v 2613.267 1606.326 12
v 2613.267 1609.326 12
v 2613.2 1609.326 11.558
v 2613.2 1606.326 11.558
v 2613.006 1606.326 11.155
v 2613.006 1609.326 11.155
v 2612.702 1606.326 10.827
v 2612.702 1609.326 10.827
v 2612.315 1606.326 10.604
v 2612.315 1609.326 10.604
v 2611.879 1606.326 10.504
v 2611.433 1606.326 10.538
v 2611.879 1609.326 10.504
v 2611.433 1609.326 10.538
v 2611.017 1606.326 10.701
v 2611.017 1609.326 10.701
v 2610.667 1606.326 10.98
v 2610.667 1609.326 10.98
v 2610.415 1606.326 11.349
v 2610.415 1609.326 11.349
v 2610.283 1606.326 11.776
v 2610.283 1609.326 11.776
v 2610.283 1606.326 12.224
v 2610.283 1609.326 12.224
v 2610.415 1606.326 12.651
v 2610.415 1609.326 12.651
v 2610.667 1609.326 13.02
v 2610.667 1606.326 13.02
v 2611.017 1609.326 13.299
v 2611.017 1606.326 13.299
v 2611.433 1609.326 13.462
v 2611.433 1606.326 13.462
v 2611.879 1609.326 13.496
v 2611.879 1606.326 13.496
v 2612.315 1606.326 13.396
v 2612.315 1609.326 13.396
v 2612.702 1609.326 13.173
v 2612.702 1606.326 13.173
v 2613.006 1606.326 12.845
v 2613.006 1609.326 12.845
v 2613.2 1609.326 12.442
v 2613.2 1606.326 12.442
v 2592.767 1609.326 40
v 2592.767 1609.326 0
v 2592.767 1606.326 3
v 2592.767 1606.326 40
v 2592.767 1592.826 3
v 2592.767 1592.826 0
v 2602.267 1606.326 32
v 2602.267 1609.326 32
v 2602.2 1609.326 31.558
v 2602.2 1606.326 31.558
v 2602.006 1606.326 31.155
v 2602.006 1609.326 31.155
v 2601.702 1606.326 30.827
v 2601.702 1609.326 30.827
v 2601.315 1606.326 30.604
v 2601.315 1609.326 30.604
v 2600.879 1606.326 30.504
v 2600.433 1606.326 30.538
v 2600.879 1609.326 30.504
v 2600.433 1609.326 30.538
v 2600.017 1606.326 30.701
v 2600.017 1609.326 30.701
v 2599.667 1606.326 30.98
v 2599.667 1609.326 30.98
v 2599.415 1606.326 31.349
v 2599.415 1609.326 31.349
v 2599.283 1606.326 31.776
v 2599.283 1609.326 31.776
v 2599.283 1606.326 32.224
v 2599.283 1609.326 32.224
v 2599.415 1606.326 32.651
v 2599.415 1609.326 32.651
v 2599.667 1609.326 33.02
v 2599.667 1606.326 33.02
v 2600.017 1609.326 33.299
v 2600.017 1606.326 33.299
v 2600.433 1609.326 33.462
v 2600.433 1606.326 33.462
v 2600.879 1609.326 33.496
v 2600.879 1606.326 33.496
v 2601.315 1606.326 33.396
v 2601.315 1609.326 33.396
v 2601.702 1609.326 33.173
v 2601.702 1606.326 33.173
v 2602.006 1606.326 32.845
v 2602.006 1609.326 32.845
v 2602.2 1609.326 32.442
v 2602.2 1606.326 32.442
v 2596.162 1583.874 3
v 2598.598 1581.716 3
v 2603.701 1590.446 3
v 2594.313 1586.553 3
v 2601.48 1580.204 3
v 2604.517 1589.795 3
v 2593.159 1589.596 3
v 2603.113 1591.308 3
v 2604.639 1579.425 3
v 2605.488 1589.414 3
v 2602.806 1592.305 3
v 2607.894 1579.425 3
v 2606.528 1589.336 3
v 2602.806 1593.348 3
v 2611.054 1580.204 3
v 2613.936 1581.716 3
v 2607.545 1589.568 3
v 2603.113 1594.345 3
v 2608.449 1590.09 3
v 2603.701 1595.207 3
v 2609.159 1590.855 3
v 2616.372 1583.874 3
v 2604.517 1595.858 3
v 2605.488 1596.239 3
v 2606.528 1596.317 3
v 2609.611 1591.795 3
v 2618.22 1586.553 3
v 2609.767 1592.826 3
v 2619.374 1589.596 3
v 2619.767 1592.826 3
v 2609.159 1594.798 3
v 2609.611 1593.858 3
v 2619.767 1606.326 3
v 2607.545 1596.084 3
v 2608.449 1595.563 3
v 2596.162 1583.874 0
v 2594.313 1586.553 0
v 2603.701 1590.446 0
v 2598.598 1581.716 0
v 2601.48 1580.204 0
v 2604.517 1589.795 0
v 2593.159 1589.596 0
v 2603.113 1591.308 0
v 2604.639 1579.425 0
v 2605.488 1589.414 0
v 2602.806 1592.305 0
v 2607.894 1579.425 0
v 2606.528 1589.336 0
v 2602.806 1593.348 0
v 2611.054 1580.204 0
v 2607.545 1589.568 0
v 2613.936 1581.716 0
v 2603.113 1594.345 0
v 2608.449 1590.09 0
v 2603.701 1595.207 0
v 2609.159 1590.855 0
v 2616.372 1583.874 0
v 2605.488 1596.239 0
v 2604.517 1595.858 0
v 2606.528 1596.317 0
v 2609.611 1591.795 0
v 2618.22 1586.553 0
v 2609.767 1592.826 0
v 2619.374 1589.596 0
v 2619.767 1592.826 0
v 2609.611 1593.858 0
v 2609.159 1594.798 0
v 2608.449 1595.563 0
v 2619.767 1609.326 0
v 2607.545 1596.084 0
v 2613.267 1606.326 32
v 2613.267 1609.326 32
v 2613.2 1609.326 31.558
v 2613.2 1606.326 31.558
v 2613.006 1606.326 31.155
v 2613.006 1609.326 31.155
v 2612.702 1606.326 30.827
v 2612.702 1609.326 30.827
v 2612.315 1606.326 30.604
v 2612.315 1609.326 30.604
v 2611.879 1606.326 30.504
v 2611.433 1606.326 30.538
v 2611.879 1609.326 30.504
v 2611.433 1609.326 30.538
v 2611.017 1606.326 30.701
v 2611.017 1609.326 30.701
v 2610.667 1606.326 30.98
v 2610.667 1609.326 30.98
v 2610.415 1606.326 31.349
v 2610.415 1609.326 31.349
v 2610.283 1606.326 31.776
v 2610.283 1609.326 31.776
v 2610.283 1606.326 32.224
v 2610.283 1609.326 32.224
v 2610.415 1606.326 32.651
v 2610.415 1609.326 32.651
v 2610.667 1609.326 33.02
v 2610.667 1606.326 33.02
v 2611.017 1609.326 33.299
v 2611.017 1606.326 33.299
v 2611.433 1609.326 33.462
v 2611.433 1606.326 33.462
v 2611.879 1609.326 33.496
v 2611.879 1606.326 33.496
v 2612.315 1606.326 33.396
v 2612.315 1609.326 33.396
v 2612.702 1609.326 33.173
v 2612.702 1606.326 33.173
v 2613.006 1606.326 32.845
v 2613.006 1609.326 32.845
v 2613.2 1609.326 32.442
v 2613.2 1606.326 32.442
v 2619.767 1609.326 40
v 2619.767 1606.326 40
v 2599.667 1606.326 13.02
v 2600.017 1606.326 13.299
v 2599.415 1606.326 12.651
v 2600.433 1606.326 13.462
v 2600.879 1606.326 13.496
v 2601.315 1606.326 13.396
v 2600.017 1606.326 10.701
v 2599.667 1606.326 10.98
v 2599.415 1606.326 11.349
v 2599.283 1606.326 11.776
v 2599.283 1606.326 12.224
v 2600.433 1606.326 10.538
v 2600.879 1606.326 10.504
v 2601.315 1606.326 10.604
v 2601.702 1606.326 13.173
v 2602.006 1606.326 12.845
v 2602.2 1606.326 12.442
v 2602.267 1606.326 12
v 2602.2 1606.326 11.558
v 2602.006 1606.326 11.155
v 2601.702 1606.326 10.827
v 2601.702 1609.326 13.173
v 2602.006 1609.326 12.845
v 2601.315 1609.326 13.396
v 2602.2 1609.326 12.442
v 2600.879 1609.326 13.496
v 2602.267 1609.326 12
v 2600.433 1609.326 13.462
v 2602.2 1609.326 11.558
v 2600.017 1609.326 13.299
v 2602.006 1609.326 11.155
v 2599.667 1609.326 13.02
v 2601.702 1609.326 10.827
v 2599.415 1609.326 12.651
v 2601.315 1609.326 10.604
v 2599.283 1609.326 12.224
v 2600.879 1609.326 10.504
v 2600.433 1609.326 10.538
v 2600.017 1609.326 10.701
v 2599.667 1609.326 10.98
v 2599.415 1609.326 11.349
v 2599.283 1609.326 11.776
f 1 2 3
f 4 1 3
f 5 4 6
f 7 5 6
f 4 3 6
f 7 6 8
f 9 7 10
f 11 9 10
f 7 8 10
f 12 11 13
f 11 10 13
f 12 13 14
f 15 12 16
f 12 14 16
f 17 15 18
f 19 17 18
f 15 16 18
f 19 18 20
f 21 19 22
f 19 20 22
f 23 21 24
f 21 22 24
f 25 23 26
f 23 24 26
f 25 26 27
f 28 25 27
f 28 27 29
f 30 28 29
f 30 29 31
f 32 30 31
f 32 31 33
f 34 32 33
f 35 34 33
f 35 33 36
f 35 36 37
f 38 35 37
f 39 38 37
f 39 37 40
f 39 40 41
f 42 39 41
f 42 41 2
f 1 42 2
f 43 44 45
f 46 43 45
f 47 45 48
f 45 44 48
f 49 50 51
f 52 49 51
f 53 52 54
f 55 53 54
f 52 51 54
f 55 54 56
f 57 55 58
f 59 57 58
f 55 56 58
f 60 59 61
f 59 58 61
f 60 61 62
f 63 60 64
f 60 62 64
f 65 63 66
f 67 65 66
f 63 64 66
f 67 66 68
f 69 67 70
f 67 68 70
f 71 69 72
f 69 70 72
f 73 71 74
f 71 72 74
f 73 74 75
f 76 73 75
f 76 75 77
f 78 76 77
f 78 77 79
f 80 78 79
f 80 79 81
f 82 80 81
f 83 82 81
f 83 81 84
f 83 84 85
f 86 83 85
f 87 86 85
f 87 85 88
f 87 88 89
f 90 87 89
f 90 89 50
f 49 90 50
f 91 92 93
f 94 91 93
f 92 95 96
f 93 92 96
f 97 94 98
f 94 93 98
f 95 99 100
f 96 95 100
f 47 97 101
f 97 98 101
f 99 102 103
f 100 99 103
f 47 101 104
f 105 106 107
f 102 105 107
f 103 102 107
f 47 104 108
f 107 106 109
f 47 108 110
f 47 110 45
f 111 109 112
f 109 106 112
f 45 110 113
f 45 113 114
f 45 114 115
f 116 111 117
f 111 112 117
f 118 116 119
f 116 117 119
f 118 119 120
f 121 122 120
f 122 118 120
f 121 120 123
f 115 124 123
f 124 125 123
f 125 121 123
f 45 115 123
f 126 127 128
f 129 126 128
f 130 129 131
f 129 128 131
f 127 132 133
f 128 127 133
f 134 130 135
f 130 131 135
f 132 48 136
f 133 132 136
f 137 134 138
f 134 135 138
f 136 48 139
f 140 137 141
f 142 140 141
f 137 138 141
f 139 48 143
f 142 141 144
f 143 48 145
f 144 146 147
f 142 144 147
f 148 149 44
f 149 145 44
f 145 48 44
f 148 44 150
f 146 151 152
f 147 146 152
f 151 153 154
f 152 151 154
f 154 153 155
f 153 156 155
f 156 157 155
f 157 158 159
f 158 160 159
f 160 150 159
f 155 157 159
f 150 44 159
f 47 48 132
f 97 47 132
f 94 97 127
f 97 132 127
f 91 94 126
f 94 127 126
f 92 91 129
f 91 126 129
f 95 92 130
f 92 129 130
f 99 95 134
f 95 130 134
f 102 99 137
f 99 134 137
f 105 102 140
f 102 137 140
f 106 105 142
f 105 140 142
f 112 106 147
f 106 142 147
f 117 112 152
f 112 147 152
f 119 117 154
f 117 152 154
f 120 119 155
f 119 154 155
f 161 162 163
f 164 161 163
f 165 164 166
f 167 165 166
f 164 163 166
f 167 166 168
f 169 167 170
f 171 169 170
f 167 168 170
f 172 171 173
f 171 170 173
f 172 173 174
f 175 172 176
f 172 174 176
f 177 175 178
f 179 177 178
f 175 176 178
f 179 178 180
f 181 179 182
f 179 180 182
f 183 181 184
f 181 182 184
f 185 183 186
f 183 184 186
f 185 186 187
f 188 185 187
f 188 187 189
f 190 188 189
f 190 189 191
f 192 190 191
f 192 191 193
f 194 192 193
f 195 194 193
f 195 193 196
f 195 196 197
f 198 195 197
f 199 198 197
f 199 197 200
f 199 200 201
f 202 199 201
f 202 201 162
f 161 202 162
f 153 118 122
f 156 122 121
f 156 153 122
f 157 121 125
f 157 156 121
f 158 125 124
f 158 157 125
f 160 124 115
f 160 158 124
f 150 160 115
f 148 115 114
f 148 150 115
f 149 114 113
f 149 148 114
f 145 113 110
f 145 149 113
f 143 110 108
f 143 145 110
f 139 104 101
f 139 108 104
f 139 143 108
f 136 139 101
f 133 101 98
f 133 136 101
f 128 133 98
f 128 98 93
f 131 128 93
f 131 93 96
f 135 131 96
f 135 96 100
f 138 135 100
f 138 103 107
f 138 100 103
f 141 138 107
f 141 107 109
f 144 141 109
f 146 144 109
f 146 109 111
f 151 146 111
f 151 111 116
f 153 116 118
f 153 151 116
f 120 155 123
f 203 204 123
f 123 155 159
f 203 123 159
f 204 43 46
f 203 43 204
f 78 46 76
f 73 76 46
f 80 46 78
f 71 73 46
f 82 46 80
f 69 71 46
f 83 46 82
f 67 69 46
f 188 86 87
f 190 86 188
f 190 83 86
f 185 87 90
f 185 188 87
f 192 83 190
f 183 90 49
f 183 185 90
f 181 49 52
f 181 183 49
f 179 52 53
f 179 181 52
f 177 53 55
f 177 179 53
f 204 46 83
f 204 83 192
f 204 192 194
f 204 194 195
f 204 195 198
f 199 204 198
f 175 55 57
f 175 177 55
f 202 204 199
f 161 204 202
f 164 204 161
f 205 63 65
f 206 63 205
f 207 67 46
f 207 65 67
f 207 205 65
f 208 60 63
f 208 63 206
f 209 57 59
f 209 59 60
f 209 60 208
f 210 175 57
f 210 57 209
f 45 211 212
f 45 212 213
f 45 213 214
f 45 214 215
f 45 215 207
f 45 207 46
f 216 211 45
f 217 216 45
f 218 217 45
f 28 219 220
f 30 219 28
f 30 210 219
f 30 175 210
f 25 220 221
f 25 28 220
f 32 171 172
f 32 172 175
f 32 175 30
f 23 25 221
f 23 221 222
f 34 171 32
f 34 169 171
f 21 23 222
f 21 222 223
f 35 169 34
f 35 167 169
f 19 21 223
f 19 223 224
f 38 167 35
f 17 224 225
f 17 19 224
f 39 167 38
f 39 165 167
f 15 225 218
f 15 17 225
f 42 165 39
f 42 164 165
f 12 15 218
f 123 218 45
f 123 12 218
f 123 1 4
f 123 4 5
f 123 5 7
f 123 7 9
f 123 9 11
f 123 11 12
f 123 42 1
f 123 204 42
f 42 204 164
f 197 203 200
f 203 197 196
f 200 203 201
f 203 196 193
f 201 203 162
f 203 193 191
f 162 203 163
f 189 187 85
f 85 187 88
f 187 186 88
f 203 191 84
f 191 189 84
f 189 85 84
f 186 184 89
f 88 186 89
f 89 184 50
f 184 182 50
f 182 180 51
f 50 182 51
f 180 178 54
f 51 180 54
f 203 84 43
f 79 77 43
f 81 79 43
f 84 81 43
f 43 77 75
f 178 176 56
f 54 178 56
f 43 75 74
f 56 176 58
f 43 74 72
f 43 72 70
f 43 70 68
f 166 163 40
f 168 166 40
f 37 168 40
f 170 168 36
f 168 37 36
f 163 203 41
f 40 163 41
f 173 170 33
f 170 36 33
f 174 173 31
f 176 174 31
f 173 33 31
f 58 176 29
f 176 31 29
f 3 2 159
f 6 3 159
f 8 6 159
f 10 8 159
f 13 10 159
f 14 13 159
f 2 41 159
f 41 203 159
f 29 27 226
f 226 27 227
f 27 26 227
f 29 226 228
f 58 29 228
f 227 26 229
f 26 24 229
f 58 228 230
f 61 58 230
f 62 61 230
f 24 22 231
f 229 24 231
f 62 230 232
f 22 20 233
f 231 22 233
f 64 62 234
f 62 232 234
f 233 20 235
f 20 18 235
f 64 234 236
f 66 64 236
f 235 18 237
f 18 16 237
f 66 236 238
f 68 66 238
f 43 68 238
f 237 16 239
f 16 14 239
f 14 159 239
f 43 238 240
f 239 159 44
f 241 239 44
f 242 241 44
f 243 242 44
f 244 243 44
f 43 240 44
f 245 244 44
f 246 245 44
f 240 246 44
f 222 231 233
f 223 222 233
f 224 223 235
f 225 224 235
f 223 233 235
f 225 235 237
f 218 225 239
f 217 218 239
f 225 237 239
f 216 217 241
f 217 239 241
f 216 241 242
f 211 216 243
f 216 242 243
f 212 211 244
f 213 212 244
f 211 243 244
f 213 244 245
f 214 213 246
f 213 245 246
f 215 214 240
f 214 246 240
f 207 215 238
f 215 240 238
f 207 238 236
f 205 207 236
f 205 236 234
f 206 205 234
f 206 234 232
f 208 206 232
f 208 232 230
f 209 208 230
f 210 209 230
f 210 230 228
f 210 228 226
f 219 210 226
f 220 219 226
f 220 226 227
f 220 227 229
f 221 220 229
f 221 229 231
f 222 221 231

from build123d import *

# Parameters (mm, degrees)
MODEL_R             = 3.5
EXTRUDE_1_DEPTH     = 40
SKETCH_3_W          = 37
SKETCH_3_H          = 37
CUT_EXTRUDE_1_DEPTH = 40
SKETCH_4_R          = 1.5
CUT_EXTRUDE_2_DEPTH = 40


with BuildPart() as part:
    # Model → 凸台-拉伸1 (new body)
    with BuildSketch(Plane.XY):
        with BuildLine():
            Line((2619.766714505, 1592.826425633), (2619.766714505, 1609.326425633))
            Line((2619.766714505, 1609.326425633), (2592.766714505, 1609.326425633))
            Line((2592.766714505, 1609.326425633), (2592.766714505, 1592.826425633))
            ThreePointArc((2592.766714505, 1592.826425633), (2606.266714505, 1579.326425633), (2619.766714505, 1592.826425633))
        make_face()
        with Locations((2606.266714505, 1592.826425633)):
            Circle(MODEL_R, mode=Mode.SUBTRACT)
    extrude(amount=EXTRUDE_1_DEPTH)

    # 草图3 → 切除-拉伸1 (cut)
    with BuildSketch(Plane(origin=(2619.766714505, 0, 0), x_dir=(0, 0, -1), z_dir=(1, 0, 0))):
        with Locations((-21.5, 1587.826425633)):
            Rectangle(SKETCH_3_W, SKETCH_3_H)
    extrude(amount=-CUT_EXTRUDE_1_DEPTH, mode=Mode.SUBTRACT)

    # 草图4 → 切除-拉伸2 (cut)
    with BuildSketch(Plane(origin=(0, 1609.326425633, 0), x_dir=(1, 0, 0), z_dir=(0, 1, 0))):
        with Locations((2600.766714505, -32)):
            Circle(SKETCH_4_R)
        with Locations((2611.766714505, -32)):
            Circle(SKETCH_4_R)
        with Locations((2600.766714505, -12)):
            Circle(SKETCH_4_R)
        with Locations((2611.766714505, -12)):
            Circle(SKETCH_4_R)
    extrude(amount=-CUT_EXTRUDE_2_DEPTH, mode=Mode.SUBTRACT)


solid = part.part
